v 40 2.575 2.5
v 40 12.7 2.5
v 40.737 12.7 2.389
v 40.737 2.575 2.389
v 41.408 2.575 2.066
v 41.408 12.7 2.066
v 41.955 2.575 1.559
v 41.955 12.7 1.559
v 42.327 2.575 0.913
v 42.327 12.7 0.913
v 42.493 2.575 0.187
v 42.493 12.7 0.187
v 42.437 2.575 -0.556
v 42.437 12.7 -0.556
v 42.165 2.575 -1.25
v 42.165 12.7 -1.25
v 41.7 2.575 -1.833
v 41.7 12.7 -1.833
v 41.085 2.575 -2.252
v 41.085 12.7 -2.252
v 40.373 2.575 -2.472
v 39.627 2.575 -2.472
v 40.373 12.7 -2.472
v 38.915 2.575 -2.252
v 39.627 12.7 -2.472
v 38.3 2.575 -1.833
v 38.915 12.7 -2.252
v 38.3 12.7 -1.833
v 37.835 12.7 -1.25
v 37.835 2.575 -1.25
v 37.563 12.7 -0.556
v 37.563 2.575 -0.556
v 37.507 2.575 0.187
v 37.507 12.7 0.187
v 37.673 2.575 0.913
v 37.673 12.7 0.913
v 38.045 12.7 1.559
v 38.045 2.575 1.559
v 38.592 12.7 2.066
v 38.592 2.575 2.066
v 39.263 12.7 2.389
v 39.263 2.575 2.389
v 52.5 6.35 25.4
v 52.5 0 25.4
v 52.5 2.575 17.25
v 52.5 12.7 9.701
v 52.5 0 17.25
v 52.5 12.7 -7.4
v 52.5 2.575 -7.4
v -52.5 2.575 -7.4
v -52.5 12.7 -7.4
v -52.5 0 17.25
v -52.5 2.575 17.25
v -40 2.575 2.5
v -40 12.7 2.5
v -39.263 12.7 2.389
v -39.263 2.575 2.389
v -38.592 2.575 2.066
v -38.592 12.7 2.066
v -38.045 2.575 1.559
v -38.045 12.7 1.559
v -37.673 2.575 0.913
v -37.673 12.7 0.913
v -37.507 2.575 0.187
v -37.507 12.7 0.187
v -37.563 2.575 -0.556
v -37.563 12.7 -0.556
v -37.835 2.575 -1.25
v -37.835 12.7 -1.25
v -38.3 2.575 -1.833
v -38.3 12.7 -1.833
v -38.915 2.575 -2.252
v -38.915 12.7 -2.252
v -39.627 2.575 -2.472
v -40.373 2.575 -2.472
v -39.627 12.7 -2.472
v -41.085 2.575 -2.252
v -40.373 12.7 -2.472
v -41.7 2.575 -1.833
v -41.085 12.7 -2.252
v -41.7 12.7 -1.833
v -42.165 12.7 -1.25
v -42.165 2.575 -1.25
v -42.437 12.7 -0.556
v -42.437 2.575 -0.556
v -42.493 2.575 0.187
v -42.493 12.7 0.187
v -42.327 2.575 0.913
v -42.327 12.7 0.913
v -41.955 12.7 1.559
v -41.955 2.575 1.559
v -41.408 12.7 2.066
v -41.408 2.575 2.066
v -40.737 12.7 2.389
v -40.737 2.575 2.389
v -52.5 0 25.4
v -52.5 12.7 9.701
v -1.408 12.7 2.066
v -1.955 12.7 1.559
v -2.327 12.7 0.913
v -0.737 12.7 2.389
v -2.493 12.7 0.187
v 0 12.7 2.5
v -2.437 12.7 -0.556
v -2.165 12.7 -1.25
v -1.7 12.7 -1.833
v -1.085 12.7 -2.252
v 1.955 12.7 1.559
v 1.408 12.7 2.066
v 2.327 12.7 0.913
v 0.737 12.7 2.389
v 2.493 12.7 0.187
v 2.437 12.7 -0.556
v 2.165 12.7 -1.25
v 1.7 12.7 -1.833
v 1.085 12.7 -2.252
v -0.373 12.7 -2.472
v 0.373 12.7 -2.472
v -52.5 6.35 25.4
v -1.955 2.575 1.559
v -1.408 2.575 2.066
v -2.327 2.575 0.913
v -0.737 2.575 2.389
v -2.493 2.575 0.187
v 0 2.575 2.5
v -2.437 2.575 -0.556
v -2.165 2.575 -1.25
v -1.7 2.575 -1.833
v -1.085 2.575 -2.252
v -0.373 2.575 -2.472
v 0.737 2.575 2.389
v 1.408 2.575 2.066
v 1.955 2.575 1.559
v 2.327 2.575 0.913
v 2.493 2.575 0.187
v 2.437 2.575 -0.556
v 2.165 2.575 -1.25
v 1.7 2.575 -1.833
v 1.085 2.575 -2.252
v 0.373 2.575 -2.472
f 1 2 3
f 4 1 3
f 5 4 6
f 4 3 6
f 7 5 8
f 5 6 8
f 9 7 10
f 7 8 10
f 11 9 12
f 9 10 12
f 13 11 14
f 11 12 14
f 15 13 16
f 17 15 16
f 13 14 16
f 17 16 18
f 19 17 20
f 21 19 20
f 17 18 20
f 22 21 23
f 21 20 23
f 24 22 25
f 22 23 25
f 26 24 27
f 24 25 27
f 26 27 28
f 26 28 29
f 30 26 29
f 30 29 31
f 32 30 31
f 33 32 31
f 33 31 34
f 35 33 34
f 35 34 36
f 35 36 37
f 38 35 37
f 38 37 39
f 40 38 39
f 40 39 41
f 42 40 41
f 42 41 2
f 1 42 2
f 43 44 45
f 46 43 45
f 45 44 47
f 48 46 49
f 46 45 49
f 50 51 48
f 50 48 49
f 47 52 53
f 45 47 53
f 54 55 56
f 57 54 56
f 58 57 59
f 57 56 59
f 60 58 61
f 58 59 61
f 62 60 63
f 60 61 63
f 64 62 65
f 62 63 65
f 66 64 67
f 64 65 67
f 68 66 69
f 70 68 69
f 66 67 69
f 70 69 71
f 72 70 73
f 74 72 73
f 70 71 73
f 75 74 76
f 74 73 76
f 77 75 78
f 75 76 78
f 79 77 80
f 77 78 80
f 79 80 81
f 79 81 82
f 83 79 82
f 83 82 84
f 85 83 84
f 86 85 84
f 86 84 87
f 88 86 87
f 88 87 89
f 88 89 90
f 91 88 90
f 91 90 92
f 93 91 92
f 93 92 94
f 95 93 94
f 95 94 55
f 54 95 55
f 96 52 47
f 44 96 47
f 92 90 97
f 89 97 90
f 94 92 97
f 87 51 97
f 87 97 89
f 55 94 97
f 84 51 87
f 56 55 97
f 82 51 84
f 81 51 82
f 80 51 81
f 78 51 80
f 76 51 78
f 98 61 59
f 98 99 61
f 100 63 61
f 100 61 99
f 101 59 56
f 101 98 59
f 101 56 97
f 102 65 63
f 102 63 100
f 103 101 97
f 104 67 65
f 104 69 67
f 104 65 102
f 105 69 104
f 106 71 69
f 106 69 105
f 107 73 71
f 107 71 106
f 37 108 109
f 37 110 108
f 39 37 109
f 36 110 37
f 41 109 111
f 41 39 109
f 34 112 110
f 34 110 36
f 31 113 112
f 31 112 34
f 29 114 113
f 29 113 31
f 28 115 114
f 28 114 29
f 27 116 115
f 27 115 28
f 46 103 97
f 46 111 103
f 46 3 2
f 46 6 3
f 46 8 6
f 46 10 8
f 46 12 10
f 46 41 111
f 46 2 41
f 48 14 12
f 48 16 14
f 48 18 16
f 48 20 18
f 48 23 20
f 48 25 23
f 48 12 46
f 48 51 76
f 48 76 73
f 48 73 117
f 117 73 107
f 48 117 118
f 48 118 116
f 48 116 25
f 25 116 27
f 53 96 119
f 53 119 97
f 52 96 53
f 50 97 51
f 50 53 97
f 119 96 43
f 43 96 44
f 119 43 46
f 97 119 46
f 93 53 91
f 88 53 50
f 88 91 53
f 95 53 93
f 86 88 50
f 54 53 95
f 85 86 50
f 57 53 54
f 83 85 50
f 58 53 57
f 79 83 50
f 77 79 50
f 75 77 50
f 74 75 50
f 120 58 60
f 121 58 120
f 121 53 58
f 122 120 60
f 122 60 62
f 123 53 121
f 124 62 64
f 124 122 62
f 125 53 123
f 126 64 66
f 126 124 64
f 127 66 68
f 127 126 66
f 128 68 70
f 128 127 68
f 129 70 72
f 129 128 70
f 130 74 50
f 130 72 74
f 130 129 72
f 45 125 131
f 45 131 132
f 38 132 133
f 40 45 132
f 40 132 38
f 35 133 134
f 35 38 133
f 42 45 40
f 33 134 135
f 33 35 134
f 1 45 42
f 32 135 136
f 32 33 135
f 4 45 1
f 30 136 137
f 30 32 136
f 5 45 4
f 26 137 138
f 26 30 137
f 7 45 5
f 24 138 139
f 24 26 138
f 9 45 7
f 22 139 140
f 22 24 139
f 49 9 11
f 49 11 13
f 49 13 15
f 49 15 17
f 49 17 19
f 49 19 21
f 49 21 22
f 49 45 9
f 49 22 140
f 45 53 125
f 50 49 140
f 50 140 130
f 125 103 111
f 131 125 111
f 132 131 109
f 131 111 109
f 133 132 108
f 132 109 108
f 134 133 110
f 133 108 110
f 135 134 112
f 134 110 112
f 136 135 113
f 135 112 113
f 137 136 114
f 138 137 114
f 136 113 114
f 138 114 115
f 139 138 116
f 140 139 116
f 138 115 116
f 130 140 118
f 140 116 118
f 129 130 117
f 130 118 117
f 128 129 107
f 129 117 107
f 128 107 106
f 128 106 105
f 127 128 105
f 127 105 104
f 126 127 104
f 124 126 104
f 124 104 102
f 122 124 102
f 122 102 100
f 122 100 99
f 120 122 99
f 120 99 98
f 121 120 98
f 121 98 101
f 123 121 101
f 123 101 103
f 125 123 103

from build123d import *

# Parameters (mm, degrees)
CROQUIS1_W              = 105
CROQUIS1_H              = 50.8
SALIENTE_EXTRUIR1_DEPTH = 12.7
CROQUIS2_W              = 24.650197811
CROQUIS2_H              = 2.575416839
CORTAR_EXTRUIR1_DEPTH   = 109.772468943
CROQUIS3_R              = 2.5
CORTAR_EXTRUIR2_DEPTH   = 60.688357324


with BuildPart() as part:
    # Croquis1 → Saliente-Extruir1 (new body)
    with BuildSketch(Plane(origin=(0, 0, 0), x_dir=(1, 0, 0), z_dir=(0, 1, 0))):
        Rectangle(CROQUIS1_W, CROQUIS1_H)
    extrude(amount=SALIENTE_EXTRUIR1_DEPTH)

    # Croquis2 → Cortar-Extruir1 (cut, through all)
    with BuildSketch(Plane(origin=(52.5, 0, 0), x_dir=(0, 0, -1), z_dir=(1, 0, 0))):
        Polygon((-25.4, 6.35), (-9.701031489, 12.7), (-25.4, 12.7), align=None)
        with Locations((-4.925098905, 1.28770842)):
            Rectangle(CROQUIS2_W, CROQUIS2_H)
        Polygon((25.4, 0), (25.4, 12.7), (7.4, 12.7), (7.4, 2.575416839), (7.4, 0), align=None)
    extrude(amount=-CORTAR_EXTRUIR1_DEPTH, mode=Mode.SUBTRACT)

    # Croquis3 → Cortar-Extruir2 (cut, through all)
    with BuildSketch(Plane(origin=(0, 12.7, 0), x_dir=(1, 0, 0), z_dir=(0, 1, 0))):
        with Locations(Location((0, 0, 0), (0, 0, 270))):
            Circle(CROQUIS3_R)
        with Locations(Location((-40, 0, 0), (0, 0, 270))):
            Circle(CROQUIS3_R)
        with Locations(Location((40, 0, 0), (0, 0, 270))):
            Circle(CROQUIS3_R)
    extrude(amount=-CORTAR_EXTRUIR2_DEPTH, mode=Mode.SUBTRACT)


solid = part.part
